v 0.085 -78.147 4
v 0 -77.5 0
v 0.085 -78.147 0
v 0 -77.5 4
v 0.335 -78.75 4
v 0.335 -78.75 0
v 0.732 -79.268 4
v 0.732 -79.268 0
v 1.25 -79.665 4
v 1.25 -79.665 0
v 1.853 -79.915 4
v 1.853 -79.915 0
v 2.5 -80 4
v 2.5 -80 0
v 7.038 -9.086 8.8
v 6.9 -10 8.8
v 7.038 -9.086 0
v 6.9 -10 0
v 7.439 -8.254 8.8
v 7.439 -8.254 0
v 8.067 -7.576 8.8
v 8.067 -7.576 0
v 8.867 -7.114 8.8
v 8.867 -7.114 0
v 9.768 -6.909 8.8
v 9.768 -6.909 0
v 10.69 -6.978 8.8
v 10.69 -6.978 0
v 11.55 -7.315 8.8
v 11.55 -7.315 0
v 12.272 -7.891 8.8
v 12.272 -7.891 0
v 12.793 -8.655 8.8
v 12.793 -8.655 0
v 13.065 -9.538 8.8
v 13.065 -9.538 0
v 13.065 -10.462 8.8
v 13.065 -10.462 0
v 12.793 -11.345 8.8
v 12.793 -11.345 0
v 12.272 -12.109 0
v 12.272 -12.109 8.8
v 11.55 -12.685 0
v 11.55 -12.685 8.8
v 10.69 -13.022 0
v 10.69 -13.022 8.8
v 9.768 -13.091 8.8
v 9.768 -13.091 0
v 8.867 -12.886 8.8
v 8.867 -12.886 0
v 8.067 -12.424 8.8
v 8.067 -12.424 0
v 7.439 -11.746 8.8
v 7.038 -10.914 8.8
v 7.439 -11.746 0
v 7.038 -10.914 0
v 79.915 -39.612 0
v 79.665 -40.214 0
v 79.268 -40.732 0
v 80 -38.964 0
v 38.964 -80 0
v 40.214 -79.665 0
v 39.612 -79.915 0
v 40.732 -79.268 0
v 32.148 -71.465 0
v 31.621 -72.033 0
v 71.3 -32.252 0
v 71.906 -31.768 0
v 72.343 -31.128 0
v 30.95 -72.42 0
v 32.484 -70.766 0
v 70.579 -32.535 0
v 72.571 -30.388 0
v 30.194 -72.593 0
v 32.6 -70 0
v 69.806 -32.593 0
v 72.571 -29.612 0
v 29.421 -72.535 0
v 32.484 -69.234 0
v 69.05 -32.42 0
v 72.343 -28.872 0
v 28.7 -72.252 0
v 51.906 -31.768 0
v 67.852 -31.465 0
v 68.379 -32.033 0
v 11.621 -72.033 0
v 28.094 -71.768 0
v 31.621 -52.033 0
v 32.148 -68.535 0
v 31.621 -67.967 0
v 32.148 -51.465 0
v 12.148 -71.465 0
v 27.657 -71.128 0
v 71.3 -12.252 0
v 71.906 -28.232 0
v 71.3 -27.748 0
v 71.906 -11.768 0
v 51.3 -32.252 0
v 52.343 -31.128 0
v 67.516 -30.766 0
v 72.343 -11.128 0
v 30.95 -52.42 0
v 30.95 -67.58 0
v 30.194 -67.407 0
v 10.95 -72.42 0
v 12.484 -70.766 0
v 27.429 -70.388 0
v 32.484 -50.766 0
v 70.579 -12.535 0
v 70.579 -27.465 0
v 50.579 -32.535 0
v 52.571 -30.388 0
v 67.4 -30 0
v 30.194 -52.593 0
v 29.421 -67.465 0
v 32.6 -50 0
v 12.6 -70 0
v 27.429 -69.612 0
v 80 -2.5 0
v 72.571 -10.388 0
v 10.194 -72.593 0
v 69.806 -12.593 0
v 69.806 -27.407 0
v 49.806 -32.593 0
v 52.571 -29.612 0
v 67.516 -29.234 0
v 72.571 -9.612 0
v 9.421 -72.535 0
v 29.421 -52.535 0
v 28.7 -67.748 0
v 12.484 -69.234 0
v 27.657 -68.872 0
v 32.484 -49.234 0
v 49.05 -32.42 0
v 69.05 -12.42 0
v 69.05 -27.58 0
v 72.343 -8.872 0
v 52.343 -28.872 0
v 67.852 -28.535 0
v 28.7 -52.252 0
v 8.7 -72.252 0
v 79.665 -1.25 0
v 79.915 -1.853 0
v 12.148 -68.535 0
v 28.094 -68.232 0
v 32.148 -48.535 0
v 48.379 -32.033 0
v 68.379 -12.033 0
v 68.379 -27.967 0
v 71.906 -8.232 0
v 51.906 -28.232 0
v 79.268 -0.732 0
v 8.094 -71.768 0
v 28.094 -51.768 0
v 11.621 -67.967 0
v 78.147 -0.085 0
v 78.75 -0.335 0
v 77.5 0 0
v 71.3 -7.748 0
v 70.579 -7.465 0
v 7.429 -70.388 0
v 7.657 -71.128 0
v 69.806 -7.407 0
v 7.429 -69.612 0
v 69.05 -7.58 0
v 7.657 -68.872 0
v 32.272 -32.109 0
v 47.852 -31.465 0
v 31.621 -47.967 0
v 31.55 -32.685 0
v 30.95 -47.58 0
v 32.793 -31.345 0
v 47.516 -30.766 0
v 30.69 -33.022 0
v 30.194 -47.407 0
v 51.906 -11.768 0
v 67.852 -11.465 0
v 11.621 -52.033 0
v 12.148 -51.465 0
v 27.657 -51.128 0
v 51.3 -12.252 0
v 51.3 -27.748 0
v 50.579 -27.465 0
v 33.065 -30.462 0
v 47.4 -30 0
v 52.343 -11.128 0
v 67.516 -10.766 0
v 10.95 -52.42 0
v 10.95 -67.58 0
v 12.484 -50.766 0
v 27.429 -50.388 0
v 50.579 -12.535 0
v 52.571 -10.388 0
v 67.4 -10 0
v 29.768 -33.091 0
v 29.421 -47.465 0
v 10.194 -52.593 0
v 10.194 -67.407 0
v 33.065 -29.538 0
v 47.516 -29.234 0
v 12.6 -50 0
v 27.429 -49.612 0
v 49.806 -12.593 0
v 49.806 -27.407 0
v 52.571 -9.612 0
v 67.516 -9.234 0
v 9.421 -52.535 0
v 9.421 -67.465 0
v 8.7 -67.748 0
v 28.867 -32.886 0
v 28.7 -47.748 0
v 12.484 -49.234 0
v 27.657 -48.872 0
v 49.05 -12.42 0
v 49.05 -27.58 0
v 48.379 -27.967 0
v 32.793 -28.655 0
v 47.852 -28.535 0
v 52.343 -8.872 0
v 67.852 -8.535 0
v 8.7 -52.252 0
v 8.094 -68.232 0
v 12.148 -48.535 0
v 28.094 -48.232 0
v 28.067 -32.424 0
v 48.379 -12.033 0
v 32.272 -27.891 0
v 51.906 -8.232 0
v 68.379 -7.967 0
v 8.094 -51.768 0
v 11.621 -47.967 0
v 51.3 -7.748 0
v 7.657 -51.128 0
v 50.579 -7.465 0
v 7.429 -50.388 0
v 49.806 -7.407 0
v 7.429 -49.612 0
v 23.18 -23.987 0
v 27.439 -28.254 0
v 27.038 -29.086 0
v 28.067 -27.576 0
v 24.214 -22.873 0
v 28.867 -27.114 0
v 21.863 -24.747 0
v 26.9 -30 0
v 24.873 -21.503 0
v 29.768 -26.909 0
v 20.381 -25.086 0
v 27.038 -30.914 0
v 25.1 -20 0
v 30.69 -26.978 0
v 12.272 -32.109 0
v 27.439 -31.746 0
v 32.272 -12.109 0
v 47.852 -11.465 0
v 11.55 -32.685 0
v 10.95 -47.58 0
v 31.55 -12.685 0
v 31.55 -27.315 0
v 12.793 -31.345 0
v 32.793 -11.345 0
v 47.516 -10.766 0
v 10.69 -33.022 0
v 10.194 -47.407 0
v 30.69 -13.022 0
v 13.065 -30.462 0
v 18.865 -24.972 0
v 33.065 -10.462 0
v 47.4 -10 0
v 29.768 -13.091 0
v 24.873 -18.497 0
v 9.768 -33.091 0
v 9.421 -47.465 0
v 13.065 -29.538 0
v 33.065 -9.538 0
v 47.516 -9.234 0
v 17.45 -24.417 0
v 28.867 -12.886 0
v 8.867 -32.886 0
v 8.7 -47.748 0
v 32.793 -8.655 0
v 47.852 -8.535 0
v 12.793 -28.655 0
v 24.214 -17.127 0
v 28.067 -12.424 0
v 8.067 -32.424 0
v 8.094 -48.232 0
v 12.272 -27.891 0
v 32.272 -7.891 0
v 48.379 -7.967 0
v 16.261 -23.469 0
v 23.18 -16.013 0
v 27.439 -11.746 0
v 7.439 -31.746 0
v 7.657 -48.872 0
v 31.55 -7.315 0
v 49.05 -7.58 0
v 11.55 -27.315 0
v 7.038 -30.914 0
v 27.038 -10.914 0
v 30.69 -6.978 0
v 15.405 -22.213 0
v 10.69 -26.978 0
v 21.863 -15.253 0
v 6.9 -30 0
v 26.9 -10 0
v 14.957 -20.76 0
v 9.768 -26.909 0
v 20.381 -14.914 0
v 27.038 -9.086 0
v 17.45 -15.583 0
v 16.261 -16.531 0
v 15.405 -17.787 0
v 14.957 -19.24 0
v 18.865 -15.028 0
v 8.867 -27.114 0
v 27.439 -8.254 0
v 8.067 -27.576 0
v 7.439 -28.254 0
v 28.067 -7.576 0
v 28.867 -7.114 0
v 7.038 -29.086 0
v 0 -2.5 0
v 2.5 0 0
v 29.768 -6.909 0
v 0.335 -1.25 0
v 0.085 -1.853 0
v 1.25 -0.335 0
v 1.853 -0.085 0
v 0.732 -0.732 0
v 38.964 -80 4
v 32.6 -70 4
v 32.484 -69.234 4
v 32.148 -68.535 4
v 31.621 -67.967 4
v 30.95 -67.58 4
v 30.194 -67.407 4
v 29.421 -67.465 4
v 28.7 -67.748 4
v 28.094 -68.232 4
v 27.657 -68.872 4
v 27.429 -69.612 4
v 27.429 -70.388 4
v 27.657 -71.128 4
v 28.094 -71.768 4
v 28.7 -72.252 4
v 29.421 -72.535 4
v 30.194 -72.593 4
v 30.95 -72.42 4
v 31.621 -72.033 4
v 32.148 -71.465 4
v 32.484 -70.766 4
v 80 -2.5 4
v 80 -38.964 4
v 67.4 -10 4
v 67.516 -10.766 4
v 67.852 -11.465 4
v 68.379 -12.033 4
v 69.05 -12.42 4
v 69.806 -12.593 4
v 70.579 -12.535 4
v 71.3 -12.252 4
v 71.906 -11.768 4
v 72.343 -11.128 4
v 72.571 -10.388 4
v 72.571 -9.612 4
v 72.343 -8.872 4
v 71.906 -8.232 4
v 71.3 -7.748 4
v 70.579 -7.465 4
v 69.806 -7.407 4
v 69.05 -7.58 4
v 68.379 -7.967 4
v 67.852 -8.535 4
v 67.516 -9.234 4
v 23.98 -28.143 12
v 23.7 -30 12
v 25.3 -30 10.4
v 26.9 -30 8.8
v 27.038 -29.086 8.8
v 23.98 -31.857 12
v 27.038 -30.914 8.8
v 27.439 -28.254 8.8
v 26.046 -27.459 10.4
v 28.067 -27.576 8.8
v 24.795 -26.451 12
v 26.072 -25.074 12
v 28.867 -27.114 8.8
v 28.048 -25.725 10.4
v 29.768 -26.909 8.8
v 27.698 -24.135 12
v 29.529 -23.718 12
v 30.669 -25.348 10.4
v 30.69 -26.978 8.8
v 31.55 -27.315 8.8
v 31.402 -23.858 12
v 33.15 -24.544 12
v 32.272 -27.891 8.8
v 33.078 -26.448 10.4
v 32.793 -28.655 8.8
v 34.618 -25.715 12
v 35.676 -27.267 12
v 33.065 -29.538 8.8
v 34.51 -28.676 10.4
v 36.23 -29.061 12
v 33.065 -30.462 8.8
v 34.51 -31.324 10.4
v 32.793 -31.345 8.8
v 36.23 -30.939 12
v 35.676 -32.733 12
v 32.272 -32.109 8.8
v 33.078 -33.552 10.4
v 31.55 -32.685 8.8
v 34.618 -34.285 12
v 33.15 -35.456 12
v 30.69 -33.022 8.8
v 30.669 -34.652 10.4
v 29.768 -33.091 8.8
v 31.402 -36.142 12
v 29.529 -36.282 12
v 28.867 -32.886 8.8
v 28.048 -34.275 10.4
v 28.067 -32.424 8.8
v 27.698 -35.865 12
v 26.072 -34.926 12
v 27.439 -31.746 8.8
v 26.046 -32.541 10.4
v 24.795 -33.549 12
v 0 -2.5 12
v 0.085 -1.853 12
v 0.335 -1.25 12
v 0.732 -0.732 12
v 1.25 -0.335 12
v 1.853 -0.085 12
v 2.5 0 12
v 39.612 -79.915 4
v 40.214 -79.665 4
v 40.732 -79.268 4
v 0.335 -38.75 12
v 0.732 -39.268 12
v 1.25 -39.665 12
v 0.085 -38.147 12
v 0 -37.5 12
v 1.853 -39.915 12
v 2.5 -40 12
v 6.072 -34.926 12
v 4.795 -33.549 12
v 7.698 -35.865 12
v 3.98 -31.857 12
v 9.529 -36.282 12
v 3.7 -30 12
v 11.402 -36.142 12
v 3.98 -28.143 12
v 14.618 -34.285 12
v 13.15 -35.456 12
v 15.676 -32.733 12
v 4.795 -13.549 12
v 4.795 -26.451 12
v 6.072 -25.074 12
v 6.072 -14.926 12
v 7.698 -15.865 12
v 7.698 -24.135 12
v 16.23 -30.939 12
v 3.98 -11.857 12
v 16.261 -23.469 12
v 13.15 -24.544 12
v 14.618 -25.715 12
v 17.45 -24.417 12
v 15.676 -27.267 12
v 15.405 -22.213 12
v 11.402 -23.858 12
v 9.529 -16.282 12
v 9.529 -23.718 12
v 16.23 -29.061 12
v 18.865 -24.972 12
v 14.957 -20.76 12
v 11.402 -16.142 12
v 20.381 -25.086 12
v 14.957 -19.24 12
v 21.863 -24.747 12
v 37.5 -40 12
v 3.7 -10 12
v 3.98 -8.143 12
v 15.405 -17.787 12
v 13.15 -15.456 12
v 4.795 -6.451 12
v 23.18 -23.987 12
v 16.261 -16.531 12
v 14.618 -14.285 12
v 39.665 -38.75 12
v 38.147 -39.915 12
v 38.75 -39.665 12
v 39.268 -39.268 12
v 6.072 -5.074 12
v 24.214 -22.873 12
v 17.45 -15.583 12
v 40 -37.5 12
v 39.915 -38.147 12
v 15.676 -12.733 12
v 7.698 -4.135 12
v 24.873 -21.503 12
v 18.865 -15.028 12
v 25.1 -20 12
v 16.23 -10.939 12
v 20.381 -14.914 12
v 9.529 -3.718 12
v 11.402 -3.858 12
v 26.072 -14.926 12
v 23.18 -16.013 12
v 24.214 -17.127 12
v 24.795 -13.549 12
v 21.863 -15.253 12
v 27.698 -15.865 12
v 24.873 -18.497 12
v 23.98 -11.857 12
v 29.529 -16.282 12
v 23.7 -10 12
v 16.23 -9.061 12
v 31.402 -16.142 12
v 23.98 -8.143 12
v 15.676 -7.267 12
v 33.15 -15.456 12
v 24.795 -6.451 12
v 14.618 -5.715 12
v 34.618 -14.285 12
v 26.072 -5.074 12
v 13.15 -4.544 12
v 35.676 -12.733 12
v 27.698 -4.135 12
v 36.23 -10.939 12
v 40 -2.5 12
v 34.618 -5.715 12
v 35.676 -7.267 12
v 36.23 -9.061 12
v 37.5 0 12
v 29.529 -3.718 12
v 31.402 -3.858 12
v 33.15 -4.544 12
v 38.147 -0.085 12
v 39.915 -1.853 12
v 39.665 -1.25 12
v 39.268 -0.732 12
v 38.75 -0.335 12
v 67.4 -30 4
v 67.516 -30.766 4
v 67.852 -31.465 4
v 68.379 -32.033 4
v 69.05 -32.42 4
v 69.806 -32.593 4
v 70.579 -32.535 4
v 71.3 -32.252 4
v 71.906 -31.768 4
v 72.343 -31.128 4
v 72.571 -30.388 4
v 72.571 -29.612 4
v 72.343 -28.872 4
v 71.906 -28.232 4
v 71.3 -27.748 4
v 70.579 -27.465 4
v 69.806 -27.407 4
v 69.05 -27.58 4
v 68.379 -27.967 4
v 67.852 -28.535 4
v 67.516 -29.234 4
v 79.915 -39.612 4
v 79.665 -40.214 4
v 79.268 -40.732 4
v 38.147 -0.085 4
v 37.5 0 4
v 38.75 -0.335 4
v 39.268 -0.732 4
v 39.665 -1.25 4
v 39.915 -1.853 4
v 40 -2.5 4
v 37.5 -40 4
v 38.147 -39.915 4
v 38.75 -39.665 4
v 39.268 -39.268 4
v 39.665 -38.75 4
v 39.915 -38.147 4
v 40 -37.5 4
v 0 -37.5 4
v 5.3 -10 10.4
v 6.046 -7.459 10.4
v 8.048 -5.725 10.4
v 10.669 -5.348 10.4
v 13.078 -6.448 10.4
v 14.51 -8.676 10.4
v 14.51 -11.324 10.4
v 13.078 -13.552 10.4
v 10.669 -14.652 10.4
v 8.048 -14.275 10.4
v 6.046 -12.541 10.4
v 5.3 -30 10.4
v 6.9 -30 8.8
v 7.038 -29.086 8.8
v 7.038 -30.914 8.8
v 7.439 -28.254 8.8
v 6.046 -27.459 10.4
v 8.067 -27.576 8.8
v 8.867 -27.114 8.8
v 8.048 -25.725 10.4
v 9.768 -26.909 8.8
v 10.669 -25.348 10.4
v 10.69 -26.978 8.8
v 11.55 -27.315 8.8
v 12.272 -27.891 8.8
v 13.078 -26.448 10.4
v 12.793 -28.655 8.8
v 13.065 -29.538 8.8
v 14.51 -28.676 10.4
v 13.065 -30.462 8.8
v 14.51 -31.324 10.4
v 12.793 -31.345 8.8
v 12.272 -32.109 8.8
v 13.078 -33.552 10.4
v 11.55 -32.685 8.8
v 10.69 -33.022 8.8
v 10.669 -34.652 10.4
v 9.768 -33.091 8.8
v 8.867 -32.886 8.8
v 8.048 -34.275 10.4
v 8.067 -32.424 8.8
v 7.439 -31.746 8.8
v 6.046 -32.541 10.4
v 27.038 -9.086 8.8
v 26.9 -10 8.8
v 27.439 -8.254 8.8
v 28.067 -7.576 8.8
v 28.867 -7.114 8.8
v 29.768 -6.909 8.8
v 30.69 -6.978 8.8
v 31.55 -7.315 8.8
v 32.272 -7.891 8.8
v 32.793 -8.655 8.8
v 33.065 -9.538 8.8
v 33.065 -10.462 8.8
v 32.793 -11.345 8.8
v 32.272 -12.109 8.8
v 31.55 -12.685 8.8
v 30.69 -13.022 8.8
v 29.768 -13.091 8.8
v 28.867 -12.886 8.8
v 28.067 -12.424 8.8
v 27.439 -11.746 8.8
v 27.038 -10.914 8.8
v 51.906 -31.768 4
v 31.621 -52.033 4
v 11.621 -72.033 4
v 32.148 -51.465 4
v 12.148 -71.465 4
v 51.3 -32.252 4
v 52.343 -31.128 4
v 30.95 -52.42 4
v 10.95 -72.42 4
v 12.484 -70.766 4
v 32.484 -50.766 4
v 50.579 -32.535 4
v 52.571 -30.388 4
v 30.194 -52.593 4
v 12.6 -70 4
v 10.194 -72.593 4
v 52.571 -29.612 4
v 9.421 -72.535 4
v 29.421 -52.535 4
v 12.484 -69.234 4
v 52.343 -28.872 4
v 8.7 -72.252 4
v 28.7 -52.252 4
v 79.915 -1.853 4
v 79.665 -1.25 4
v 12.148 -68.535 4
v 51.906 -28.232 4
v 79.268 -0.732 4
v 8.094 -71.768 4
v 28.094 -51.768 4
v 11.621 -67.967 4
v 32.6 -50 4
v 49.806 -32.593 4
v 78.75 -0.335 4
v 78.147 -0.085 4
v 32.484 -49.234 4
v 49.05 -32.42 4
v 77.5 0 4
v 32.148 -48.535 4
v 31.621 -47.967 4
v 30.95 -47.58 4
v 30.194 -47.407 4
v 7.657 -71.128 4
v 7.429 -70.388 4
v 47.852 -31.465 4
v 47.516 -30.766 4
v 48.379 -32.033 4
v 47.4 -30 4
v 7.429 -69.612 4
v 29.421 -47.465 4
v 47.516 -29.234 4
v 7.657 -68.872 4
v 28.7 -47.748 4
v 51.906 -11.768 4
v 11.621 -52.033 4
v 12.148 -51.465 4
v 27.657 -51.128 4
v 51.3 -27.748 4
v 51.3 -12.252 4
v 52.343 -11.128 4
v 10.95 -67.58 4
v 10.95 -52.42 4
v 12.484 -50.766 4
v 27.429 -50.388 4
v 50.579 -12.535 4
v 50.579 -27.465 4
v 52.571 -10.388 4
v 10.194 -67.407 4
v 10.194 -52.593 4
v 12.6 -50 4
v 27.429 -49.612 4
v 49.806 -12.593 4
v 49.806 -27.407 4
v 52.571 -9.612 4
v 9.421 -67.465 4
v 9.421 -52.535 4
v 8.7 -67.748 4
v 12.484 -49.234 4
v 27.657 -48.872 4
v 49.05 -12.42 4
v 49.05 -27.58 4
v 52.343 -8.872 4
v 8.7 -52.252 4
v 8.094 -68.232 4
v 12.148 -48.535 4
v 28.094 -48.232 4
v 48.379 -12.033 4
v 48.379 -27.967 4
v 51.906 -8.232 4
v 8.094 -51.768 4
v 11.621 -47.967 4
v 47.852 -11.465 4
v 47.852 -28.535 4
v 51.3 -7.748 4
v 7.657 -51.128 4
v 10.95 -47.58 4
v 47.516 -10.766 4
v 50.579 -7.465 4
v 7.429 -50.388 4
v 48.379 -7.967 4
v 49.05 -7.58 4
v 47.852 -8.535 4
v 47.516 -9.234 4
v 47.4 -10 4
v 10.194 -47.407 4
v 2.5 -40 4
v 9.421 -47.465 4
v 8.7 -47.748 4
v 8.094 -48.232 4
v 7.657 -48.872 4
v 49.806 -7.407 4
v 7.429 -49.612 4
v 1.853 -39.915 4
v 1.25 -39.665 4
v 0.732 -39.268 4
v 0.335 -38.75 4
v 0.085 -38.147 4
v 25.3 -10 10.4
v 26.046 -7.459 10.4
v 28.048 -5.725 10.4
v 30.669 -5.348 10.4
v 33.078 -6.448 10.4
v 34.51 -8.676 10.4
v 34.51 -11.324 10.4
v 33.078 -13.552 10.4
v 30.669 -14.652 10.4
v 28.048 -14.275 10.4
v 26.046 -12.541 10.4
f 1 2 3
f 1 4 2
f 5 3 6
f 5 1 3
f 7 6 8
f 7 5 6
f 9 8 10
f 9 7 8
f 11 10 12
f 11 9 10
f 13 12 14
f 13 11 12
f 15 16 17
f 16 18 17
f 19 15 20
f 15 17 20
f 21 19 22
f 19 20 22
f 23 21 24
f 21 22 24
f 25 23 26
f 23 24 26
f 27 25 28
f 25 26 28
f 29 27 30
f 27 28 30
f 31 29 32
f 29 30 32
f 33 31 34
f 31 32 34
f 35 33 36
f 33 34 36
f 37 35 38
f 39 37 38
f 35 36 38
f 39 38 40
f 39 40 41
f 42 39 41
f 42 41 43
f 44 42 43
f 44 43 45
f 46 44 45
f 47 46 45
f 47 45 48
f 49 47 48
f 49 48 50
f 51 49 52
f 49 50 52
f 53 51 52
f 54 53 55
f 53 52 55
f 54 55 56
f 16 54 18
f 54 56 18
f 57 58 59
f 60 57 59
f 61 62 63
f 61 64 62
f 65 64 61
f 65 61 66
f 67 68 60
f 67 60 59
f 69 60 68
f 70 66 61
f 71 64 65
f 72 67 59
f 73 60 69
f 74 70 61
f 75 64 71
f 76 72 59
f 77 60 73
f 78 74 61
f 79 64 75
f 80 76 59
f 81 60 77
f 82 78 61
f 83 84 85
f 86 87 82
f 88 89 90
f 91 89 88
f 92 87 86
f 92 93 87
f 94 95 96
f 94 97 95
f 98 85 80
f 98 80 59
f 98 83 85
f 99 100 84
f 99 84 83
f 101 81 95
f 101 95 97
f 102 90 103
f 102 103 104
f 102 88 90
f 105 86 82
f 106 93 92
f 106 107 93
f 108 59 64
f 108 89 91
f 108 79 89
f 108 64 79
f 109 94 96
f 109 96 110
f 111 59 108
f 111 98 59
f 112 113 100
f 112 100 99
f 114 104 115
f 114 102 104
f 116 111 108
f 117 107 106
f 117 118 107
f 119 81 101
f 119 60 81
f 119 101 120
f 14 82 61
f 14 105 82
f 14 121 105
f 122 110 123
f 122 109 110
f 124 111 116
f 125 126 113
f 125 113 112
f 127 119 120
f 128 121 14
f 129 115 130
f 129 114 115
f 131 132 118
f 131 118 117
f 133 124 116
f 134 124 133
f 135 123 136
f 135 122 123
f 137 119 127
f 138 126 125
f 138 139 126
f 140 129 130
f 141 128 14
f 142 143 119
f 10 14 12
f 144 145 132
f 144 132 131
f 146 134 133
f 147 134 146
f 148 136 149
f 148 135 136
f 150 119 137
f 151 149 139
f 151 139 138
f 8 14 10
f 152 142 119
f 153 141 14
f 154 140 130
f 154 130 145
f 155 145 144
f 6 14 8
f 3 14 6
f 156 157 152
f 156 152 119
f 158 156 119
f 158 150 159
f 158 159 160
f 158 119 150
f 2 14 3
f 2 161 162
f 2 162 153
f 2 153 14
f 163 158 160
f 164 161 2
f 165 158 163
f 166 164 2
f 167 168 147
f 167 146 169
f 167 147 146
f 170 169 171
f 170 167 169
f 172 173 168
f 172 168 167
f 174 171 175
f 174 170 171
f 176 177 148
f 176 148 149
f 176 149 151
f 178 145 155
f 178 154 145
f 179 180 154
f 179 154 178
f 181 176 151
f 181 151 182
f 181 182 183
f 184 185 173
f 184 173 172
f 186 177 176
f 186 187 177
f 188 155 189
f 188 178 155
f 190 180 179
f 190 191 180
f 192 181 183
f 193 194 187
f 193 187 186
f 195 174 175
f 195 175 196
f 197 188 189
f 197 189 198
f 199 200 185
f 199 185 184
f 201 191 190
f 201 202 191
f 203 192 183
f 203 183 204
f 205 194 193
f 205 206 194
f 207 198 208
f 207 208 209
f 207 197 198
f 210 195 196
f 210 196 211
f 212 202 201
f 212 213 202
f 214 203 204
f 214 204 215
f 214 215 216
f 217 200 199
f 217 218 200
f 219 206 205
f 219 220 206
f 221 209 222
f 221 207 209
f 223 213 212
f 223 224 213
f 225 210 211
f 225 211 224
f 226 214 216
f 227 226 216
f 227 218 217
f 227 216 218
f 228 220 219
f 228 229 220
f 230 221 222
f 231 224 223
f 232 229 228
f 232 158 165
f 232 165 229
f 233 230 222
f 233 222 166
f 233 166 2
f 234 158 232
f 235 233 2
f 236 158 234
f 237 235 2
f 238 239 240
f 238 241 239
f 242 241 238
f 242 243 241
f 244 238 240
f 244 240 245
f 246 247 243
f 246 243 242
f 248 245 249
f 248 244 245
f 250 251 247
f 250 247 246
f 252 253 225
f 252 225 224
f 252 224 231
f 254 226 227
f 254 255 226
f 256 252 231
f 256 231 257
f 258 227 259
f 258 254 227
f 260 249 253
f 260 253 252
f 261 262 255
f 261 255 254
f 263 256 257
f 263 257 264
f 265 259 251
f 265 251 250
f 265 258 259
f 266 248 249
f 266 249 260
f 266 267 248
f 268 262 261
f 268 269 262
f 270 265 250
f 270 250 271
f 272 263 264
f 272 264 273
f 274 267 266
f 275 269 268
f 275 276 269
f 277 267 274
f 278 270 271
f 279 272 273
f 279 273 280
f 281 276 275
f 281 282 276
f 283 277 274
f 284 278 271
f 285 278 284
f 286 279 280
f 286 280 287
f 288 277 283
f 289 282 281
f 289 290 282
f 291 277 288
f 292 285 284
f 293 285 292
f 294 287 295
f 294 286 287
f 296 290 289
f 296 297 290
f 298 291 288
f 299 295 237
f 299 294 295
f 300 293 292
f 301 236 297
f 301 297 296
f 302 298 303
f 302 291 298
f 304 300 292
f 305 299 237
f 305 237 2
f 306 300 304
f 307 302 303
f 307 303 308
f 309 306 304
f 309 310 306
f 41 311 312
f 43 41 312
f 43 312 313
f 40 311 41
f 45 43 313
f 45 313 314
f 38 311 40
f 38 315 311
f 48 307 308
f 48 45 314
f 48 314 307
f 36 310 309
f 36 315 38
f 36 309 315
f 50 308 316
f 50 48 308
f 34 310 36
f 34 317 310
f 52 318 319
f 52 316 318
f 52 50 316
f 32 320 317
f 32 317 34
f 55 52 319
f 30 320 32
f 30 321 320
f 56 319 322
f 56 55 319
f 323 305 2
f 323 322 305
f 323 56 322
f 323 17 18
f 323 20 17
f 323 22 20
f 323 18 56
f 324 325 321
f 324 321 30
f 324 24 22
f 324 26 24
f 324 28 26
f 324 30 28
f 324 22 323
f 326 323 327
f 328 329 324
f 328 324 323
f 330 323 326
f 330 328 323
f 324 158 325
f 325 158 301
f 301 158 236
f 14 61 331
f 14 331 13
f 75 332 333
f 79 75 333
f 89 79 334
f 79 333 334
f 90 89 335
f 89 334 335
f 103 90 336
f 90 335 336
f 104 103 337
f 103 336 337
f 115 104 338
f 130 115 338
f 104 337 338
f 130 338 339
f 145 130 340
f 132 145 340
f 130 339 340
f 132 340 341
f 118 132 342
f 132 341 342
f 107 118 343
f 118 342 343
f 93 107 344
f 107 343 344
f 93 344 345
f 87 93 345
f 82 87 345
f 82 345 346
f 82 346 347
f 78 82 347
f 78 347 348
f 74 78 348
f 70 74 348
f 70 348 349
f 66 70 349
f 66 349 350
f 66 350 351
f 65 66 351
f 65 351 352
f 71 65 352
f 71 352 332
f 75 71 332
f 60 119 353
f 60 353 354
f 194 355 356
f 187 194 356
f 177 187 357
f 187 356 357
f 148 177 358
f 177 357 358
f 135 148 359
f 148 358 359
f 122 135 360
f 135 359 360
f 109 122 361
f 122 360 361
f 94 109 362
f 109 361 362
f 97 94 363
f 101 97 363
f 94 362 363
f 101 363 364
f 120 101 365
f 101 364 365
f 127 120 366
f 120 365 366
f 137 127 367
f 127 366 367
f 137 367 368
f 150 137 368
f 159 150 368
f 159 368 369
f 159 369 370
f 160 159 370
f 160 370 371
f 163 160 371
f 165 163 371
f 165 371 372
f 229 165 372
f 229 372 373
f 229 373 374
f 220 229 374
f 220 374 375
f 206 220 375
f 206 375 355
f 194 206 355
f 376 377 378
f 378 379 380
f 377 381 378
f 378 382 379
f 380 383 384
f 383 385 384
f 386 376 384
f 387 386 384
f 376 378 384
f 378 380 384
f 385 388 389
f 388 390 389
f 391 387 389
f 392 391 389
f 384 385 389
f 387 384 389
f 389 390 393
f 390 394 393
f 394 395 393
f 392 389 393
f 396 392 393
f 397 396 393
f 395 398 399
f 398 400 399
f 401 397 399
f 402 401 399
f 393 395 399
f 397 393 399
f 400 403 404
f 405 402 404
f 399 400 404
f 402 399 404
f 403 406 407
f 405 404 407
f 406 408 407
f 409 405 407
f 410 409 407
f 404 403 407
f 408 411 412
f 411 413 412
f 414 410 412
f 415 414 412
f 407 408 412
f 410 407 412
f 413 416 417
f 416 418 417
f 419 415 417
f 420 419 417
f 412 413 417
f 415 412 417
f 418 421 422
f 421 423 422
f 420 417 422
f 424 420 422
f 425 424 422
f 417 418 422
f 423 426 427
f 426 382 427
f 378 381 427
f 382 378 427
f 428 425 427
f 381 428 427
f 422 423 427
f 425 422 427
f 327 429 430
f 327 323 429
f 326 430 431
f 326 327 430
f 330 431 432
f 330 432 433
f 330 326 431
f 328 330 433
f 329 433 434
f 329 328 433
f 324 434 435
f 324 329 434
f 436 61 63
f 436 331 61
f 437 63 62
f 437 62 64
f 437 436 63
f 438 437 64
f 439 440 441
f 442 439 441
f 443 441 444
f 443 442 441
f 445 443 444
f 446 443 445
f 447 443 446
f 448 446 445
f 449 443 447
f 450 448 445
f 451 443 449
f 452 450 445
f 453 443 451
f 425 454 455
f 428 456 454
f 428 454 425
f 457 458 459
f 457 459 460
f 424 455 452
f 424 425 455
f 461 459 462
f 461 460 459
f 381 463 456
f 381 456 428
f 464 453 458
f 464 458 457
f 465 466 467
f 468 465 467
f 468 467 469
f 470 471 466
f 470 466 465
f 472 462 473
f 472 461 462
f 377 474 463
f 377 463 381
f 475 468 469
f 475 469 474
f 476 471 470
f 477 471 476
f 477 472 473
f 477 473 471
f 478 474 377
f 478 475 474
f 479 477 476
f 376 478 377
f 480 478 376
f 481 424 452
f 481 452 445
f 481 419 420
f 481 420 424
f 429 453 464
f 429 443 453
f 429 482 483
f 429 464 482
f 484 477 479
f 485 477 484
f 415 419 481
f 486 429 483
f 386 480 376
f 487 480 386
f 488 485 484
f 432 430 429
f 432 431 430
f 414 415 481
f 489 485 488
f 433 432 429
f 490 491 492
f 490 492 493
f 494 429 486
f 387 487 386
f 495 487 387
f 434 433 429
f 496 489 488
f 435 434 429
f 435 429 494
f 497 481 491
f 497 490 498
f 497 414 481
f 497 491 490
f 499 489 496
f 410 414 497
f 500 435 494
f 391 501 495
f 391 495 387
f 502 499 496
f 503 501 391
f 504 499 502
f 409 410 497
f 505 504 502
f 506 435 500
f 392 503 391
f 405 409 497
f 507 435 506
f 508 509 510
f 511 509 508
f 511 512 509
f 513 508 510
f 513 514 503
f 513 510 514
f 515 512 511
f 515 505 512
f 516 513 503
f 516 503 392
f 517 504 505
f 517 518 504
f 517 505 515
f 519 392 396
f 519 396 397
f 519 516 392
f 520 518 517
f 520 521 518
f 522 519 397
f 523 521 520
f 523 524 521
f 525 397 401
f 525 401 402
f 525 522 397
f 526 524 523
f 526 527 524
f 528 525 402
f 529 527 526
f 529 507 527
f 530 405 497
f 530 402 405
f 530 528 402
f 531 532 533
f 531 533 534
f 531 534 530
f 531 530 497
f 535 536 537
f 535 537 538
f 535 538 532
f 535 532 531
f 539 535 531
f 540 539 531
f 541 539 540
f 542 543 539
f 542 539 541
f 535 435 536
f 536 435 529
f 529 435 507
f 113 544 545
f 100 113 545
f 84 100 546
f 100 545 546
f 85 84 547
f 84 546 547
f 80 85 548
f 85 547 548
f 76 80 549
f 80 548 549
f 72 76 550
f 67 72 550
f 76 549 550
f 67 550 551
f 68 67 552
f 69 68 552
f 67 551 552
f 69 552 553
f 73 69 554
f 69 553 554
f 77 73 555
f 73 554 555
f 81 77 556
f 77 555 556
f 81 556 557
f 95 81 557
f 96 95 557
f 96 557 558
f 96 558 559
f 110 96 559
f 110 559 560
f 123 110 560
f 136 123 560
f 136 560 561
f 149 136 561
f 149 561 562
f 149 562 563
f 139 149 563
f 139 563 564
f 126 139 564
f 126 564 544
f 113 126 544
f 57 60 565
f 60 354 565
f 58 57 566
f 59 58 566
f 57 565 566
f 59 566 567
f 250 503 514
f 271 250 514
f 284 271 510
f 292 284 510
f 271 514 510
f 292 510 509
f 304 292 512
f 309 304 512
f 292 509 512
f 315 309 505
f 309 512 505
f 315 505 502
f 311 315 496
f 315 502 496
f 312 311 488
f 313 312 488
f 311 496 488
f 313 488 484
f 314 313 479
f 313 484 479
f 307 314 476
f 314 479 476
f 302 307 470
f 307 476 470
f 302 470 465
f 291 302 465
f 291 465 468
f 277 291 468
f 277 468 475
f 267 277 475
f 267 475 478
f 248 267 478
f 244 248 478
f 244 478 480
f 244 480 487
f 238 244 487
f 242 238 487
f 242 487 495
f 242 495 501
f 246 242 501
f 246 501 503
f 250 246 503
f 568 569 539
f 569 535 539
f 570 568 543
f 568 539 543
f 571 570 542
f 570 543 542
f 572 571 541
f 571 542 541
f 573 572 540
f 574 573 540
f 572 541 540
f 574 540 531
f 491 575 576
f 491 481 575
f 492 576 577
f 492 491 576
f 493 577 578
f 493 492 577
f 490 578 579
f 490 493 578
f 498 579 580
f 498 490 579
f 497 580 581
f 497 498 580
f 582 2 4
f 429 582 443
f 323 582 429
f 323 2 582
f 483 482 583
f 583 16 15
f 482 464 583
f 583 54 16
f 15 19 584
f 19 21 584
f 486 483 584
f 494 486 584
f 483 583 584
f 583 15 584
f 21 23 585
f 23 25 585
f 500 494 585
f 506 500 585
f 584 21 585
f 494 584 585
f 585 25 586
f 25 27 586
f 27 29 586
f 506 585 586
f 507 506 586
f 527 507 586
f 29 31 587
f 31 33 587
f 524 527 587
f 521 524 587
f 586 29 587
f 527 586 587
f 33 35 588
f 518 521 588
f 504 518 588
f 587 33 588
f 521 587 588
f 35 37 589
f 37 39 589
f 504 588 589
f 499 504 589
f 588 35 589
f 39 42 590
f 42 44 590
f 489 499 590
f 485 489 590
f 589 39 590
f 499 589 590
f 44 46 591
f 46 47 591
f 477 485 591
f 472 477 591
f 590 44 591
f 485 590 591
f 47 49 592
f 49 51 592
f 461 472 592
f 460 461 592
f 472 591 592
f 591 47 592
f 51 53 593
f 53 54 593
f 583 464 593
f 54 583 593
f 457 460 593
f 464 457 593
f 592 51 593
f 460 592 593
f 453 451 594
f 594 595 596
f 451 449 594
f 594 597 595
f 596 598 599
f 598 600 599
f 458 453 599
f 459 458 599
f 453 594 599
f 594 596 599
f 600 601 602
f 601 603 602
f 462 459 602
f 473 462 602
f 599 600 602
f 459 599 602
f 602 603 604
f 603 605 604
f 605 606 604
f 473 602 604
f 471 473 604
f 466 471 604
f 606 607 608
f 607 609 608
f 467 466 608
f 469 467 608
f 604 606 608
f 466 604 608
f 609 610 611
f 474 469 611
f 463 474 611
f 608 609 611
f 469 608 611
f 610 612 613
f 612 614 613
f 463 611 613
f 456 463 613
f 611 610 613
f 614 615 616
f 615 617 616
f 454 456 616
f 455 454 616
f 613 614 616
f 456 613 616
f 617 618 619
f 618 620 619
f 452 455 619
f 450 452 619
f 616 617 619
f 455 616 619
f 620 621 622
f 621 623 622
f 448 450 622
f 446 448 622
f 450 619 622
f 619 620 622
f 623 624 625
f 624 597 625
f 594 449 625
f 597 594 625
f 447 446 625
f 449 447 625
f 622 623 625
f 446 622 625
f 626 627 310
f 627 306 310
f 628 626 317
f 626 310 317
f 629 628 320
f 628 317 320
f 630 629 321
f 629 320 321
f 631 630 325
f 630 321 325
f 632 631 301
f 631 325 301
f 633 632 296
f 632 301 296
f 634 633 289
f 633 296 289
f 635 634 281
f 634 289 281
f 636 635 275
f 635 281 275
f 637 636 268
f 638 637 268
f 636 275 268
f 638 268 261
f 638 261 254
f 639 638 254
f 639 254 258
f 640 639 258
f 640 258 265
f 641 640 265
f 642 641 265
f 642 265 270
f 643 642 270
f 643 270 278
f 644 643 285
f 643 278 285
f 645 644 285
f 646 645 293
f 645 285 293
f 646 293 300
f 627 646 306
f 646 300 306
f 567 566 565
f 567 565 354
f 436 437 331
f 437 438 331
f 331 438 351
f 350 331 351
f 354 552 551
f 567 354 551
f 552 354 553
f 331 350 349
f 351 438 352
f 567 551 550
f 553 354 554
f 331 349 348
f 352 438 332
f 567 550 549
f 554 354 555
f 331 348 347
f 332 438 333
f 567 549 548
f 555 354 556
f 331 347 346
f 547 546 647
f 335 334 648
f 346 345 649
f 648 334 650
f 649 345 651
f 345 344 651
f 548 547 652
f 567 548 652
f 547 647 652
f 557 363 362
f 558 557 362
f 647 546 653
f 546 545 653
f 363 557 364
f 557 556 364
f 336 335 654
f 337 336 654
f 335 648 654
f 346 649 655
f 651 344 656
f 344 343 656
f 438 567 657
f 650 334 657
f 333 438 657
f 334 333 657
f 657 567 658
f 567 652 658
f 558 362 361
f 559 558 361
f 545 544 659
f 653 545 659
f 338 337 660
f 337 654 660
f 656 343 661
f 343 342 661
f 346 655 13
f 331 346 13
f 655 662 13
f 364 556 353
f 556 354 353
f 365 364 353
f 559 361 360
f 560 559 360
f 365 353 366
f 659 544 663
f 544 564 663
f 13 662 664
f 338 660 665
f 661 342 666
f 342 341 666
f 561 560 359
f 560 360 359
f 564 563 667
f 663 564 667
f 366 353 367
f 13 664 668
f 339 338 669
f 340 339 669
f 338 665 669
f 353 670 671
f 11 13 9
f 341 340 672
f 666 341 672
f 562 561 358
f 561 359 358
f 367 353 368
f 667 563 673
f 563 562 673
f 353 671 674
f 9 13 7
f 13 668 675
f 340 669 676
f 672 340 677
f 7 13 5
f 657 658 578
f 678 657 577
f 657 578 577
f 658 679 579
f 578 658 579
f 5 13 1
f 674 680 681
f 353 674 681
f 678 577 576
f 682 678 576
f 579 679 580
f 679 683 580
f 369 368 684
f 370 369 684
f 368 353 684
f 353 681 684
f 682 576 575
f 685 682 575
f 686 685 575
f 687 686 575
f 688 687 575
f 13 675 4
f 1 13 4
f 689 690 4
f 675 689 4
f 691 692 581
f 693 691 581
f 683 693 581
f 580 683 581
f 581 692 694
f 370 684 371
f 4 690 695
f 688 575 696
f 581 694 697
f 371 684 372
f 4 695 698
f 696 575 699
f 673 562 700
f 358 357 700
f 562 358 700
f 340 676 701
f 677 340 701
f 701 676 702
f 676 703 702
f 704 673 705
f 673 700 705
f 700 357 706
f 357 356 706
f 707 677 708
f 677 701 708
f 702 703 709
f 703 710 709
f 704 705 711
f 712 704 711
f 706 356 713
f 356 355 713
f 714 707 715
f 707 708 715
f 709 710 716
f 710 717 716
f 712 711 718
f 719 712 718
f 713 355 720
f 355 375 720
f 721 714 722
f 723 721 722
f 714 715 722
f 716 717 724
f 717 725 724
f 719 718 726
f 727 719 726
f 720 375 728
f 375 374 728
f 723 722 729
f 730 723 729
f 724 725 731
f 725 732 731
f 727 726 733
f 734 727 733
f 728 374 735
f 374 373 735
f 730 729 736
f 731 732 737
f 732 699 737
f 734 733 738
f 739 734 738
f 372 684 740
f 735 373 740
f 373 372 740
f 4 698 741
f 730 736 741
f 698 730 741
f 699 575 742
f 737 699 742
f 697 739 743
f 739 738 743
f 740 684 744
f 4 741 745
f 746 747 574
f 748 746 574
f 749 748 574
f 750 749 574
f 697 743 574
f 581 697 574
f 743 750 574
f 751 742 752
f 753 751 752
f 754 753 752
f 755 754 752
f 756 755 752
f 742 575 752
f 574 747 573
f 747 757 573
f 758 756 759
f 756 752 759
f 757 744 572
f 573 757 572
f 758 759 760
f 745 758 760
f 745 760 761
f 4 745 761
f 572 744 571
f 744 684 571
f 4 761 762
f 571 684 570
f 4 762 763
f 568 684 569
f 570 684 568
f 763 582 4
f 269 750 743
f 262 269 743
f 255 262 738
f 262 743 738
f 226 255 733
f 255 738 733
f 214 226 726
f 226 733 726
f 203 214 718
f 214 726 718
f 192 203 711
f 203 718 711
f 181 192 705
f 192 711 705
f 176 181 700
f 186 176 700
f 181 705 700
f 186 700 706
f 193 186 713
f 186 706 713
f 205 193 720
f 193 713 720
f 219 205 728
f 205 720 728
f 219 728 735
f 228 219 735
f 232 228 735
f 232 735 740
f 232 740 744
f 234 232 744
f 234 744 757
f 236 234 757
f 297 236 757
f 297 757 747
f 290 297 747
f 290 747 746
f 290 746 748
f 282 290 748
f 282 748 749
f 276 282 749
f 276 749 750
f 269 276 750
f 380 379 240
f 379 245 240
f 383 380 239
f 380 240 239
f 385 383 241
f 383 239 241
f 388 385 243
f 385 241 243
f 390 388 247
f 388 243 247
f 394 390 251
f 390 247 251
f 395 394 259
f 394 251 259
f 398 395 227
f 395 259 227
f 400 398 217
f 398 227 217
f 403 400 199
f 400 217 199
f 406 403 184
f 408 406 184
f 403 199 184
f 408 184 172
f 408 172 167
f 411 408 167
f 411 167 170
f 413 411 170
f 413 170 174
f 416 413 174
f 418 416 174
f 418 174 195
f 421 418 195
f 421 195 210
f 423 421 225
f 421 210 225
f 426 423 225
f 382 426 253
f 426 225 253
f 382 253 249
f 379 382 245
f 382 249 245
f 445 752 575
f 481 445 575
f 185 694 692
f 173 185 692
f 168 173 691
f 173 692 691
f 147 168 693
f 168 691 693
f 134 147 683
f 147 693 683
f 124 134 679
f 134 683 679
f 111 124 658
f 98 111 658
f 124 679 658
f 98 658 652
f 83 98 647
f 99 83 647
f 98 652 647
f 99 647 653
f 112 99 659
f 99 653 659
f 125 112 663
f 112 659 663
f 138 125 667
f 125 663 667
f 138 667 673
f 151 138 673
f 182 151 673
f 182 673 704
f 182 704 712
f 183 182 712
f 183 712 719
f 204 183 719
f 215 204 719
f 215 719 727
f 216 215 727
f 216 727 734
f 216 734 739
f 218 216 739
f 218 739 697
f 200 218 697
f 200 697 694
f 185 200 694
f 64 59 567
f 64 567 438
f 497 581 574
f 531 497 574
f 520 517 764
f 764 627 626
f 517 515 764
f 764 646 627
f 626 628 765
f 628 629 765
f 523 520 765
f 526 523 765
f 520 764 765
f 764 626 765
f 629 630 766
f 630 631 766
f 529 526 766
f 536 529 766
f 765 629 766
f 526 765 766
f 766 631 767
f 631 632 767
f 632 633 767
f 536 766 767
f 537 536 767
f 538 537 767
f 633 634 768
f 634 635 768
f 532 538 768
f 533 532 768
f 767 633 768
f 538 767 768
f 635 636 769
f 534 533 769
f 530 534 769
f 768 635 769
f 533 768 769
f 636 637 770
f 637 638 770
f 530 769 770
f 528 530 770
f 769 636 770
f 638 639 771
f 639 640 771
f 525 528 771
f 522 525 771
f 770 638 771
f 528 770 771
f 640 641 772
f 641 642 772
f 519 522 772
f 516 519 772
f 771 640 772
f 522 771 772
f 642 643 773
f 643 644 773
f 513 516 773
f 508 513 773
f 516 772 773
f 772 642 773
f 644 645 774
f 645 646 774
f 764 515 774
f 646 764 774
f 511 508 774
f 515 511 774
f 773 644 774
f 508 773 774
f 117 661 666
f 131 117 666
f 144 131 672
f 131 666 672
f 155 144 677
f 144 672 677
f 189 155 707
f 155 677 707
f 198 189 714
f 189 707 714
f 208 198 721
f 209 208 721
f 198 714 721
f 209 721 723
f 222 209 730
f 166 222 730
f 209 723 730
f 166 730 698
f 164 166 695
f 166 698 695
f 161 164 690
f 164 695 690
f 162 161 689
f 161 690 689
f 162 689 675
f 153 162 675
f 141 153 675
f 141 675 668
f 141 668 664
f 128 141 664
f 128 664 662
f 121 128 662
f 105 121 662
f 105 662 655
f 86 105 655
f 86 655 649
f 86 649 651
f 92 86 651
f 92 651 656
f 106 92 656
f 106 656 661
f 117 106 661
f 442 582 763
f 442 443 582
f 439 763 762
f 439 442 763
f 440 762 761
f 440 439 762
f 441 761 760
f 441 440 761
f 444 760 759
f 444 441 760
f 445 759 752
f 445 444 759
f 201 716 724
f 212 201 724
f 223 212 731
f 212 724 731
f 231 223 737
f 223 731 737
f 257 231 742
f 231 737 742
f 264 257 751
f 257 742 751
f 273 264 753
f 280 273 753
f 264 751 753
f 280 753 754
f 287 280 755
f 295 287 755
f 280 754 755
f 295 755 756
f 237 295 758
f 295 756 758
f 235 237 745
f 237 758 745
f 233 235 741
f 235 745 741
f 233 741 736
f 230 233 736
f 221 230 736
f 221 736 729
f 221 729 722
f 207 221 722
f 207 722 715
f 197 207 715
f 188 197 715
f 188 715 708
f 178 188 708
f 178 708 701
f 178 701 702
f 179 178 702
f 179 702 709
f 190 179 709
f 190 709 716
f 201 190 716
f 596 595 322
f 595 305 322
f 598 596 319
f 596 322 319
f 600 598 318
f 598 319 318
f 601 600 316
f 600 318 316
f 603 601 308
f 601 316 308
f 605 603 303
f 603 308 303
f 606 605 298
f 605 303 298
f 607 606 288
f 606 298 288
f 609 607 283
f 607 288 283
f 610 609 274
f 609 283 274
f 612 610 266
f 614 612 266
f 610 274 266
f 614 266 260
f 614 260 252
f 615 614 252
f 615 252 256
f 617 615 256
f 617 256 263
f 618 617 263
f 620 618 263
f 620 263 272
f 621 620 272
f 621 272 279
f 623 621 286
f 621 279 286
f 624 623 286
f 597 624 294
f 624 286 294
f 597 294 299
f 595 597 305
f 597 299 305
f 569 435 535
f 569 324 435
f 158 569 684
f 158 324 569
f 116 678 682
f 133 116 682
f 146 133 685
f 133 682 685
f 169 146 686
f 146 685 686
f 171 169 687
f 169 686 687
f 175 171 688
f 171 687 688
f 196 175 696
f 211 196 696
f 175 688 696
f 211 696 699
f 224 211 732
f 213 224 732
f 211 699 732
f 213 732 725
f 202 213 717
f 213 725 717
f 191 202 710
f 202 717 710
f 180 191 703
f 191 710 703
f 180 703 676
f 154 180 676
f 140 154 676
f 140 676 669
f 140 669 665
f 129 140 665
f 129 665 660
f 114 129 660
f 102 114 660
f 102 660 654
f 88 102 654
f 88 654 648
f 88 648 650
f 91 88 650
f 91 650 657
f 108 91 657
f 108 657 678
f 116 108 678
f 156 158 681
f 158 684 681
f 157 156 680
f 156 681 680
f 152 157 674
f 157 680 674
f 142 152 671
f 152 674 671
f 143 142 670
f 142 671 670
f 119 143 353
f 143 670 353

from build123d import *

# Parameters (mm, degrees)
EXTRUDE_1_DEPTH             = 4
SKETCH_2_W                  = 40
SKETCH_2_H                  = 40
EXTRUDE_2_DEPTH             = 8
HOLE_WIZARD_M61_D           = 6.2
HOLE_WIZARD_M61_CSINK_D     = 12.6
HOLE_WIZARD_M61_CSINK_ANGLE = 90
SKETCH_5_R                  = 5.1
CUT_EXTRUDE_1_DEPTH         = 114.771701227
SKETCH_6_R                  = 2.6
CUT_EXTRUDE_2_DEPTH         = 114.41957503
FILLET_1_R                  = 2.5


with BuildPart() as part:
    # Эскиз1 → Бобышка-Вытянуть1 (new body)
    with BuildSketch(Plane.XY):
        Polygon((0, 0), (80, 0), (80, -40), (40, -80), (0, -80), align=None)
    extrude(amount=EXTRUDE_1_DEPTH)

    # Эскиз2 → Бобышка-Вытянуть2 (add)
    with BuildSketch(Plane.XY.offset(4)):
        with Locations((20, -20)):
            Rectangle(SKETCH_2_W, SKETCH_2_H)
    extrude(amount=EXTRUDE_2_DEPTH)

    # Зенковка для винта с полупотайной головкой M61 (through all)
    with Locations(Plane(origin=(10, -30, 12), x_dir=(1, 0, 0), z_dir=(0, 0, 1))):
        with Locations((0, 0), (0, 20), (20, 20), (20, 0)):
            CounterSinkHole(HOLE_WIZARD_M61_D / 2, HOLE_WIZARD_M61_CSINK_D / 2, counter_sink_angle=HOLE_WIZARD_M61_CSINK_ANGLE)

    # Эскиз5 → Вырез-Вытянуть1 (cut, through all)
    with BuildSketch(Plane.XY.offset(12)):
        with Locations((20, -20)):
            Circle(SKETCH_5_R)
    extrude(amount=-CUT_EXTRUDE_1_DEPTH, mode=Mode.SUBTRACT)

    # Эскиз6 → Вырез-Вытянуть2 (cut, through all)
    with BuildSketch(Plane.XY.offset(4)):
        with Locations((10, -50)):
            Circle(SKETCH_6_R)
        with Locations((30, -50)):
            Circle(SKETCH_6_R)
        with Locations((30, -70)):
            Circle(SKETCH_6_R)
        with Locations((10, -70)):
            Circle(SKETCH_6_R)
        with Locations(Location((70, -10, 0), (0, 0, 180))):
            Circle(SKETCH_6_R)
        with Locations(Location((70, -30, 0), (0, 0, 180))):
            Circle(SKETCH_6_R)
        with Locations(Location((50, -30, 0), (0, 0, 180))):
            Circle(SKETCH_6_R)
        with Locations(Location((50, -10, 0), (0, 0, 180))):
            Circle(SKETCH_6_R)
    extrude(amount=-CUT_EXTRUDE_2_DEPTH, mode=Mode.SUBTRACT)

    # Скругление1
    fillet_1_edges = [part.edges().sort_by_distance(p)[0] for p in [
        (0, -40, 8),
        (40, -40, 8),
        (40, 0, 8),
        (0, 0, 6),
        (80, 0, 2),
        (80, -40, 2),
        (40, -80, 2),
        (0, -80, 2),
    ]]
    fillet(fillet_1_edges, radius=FILLET_1_R)


solid = part.part
